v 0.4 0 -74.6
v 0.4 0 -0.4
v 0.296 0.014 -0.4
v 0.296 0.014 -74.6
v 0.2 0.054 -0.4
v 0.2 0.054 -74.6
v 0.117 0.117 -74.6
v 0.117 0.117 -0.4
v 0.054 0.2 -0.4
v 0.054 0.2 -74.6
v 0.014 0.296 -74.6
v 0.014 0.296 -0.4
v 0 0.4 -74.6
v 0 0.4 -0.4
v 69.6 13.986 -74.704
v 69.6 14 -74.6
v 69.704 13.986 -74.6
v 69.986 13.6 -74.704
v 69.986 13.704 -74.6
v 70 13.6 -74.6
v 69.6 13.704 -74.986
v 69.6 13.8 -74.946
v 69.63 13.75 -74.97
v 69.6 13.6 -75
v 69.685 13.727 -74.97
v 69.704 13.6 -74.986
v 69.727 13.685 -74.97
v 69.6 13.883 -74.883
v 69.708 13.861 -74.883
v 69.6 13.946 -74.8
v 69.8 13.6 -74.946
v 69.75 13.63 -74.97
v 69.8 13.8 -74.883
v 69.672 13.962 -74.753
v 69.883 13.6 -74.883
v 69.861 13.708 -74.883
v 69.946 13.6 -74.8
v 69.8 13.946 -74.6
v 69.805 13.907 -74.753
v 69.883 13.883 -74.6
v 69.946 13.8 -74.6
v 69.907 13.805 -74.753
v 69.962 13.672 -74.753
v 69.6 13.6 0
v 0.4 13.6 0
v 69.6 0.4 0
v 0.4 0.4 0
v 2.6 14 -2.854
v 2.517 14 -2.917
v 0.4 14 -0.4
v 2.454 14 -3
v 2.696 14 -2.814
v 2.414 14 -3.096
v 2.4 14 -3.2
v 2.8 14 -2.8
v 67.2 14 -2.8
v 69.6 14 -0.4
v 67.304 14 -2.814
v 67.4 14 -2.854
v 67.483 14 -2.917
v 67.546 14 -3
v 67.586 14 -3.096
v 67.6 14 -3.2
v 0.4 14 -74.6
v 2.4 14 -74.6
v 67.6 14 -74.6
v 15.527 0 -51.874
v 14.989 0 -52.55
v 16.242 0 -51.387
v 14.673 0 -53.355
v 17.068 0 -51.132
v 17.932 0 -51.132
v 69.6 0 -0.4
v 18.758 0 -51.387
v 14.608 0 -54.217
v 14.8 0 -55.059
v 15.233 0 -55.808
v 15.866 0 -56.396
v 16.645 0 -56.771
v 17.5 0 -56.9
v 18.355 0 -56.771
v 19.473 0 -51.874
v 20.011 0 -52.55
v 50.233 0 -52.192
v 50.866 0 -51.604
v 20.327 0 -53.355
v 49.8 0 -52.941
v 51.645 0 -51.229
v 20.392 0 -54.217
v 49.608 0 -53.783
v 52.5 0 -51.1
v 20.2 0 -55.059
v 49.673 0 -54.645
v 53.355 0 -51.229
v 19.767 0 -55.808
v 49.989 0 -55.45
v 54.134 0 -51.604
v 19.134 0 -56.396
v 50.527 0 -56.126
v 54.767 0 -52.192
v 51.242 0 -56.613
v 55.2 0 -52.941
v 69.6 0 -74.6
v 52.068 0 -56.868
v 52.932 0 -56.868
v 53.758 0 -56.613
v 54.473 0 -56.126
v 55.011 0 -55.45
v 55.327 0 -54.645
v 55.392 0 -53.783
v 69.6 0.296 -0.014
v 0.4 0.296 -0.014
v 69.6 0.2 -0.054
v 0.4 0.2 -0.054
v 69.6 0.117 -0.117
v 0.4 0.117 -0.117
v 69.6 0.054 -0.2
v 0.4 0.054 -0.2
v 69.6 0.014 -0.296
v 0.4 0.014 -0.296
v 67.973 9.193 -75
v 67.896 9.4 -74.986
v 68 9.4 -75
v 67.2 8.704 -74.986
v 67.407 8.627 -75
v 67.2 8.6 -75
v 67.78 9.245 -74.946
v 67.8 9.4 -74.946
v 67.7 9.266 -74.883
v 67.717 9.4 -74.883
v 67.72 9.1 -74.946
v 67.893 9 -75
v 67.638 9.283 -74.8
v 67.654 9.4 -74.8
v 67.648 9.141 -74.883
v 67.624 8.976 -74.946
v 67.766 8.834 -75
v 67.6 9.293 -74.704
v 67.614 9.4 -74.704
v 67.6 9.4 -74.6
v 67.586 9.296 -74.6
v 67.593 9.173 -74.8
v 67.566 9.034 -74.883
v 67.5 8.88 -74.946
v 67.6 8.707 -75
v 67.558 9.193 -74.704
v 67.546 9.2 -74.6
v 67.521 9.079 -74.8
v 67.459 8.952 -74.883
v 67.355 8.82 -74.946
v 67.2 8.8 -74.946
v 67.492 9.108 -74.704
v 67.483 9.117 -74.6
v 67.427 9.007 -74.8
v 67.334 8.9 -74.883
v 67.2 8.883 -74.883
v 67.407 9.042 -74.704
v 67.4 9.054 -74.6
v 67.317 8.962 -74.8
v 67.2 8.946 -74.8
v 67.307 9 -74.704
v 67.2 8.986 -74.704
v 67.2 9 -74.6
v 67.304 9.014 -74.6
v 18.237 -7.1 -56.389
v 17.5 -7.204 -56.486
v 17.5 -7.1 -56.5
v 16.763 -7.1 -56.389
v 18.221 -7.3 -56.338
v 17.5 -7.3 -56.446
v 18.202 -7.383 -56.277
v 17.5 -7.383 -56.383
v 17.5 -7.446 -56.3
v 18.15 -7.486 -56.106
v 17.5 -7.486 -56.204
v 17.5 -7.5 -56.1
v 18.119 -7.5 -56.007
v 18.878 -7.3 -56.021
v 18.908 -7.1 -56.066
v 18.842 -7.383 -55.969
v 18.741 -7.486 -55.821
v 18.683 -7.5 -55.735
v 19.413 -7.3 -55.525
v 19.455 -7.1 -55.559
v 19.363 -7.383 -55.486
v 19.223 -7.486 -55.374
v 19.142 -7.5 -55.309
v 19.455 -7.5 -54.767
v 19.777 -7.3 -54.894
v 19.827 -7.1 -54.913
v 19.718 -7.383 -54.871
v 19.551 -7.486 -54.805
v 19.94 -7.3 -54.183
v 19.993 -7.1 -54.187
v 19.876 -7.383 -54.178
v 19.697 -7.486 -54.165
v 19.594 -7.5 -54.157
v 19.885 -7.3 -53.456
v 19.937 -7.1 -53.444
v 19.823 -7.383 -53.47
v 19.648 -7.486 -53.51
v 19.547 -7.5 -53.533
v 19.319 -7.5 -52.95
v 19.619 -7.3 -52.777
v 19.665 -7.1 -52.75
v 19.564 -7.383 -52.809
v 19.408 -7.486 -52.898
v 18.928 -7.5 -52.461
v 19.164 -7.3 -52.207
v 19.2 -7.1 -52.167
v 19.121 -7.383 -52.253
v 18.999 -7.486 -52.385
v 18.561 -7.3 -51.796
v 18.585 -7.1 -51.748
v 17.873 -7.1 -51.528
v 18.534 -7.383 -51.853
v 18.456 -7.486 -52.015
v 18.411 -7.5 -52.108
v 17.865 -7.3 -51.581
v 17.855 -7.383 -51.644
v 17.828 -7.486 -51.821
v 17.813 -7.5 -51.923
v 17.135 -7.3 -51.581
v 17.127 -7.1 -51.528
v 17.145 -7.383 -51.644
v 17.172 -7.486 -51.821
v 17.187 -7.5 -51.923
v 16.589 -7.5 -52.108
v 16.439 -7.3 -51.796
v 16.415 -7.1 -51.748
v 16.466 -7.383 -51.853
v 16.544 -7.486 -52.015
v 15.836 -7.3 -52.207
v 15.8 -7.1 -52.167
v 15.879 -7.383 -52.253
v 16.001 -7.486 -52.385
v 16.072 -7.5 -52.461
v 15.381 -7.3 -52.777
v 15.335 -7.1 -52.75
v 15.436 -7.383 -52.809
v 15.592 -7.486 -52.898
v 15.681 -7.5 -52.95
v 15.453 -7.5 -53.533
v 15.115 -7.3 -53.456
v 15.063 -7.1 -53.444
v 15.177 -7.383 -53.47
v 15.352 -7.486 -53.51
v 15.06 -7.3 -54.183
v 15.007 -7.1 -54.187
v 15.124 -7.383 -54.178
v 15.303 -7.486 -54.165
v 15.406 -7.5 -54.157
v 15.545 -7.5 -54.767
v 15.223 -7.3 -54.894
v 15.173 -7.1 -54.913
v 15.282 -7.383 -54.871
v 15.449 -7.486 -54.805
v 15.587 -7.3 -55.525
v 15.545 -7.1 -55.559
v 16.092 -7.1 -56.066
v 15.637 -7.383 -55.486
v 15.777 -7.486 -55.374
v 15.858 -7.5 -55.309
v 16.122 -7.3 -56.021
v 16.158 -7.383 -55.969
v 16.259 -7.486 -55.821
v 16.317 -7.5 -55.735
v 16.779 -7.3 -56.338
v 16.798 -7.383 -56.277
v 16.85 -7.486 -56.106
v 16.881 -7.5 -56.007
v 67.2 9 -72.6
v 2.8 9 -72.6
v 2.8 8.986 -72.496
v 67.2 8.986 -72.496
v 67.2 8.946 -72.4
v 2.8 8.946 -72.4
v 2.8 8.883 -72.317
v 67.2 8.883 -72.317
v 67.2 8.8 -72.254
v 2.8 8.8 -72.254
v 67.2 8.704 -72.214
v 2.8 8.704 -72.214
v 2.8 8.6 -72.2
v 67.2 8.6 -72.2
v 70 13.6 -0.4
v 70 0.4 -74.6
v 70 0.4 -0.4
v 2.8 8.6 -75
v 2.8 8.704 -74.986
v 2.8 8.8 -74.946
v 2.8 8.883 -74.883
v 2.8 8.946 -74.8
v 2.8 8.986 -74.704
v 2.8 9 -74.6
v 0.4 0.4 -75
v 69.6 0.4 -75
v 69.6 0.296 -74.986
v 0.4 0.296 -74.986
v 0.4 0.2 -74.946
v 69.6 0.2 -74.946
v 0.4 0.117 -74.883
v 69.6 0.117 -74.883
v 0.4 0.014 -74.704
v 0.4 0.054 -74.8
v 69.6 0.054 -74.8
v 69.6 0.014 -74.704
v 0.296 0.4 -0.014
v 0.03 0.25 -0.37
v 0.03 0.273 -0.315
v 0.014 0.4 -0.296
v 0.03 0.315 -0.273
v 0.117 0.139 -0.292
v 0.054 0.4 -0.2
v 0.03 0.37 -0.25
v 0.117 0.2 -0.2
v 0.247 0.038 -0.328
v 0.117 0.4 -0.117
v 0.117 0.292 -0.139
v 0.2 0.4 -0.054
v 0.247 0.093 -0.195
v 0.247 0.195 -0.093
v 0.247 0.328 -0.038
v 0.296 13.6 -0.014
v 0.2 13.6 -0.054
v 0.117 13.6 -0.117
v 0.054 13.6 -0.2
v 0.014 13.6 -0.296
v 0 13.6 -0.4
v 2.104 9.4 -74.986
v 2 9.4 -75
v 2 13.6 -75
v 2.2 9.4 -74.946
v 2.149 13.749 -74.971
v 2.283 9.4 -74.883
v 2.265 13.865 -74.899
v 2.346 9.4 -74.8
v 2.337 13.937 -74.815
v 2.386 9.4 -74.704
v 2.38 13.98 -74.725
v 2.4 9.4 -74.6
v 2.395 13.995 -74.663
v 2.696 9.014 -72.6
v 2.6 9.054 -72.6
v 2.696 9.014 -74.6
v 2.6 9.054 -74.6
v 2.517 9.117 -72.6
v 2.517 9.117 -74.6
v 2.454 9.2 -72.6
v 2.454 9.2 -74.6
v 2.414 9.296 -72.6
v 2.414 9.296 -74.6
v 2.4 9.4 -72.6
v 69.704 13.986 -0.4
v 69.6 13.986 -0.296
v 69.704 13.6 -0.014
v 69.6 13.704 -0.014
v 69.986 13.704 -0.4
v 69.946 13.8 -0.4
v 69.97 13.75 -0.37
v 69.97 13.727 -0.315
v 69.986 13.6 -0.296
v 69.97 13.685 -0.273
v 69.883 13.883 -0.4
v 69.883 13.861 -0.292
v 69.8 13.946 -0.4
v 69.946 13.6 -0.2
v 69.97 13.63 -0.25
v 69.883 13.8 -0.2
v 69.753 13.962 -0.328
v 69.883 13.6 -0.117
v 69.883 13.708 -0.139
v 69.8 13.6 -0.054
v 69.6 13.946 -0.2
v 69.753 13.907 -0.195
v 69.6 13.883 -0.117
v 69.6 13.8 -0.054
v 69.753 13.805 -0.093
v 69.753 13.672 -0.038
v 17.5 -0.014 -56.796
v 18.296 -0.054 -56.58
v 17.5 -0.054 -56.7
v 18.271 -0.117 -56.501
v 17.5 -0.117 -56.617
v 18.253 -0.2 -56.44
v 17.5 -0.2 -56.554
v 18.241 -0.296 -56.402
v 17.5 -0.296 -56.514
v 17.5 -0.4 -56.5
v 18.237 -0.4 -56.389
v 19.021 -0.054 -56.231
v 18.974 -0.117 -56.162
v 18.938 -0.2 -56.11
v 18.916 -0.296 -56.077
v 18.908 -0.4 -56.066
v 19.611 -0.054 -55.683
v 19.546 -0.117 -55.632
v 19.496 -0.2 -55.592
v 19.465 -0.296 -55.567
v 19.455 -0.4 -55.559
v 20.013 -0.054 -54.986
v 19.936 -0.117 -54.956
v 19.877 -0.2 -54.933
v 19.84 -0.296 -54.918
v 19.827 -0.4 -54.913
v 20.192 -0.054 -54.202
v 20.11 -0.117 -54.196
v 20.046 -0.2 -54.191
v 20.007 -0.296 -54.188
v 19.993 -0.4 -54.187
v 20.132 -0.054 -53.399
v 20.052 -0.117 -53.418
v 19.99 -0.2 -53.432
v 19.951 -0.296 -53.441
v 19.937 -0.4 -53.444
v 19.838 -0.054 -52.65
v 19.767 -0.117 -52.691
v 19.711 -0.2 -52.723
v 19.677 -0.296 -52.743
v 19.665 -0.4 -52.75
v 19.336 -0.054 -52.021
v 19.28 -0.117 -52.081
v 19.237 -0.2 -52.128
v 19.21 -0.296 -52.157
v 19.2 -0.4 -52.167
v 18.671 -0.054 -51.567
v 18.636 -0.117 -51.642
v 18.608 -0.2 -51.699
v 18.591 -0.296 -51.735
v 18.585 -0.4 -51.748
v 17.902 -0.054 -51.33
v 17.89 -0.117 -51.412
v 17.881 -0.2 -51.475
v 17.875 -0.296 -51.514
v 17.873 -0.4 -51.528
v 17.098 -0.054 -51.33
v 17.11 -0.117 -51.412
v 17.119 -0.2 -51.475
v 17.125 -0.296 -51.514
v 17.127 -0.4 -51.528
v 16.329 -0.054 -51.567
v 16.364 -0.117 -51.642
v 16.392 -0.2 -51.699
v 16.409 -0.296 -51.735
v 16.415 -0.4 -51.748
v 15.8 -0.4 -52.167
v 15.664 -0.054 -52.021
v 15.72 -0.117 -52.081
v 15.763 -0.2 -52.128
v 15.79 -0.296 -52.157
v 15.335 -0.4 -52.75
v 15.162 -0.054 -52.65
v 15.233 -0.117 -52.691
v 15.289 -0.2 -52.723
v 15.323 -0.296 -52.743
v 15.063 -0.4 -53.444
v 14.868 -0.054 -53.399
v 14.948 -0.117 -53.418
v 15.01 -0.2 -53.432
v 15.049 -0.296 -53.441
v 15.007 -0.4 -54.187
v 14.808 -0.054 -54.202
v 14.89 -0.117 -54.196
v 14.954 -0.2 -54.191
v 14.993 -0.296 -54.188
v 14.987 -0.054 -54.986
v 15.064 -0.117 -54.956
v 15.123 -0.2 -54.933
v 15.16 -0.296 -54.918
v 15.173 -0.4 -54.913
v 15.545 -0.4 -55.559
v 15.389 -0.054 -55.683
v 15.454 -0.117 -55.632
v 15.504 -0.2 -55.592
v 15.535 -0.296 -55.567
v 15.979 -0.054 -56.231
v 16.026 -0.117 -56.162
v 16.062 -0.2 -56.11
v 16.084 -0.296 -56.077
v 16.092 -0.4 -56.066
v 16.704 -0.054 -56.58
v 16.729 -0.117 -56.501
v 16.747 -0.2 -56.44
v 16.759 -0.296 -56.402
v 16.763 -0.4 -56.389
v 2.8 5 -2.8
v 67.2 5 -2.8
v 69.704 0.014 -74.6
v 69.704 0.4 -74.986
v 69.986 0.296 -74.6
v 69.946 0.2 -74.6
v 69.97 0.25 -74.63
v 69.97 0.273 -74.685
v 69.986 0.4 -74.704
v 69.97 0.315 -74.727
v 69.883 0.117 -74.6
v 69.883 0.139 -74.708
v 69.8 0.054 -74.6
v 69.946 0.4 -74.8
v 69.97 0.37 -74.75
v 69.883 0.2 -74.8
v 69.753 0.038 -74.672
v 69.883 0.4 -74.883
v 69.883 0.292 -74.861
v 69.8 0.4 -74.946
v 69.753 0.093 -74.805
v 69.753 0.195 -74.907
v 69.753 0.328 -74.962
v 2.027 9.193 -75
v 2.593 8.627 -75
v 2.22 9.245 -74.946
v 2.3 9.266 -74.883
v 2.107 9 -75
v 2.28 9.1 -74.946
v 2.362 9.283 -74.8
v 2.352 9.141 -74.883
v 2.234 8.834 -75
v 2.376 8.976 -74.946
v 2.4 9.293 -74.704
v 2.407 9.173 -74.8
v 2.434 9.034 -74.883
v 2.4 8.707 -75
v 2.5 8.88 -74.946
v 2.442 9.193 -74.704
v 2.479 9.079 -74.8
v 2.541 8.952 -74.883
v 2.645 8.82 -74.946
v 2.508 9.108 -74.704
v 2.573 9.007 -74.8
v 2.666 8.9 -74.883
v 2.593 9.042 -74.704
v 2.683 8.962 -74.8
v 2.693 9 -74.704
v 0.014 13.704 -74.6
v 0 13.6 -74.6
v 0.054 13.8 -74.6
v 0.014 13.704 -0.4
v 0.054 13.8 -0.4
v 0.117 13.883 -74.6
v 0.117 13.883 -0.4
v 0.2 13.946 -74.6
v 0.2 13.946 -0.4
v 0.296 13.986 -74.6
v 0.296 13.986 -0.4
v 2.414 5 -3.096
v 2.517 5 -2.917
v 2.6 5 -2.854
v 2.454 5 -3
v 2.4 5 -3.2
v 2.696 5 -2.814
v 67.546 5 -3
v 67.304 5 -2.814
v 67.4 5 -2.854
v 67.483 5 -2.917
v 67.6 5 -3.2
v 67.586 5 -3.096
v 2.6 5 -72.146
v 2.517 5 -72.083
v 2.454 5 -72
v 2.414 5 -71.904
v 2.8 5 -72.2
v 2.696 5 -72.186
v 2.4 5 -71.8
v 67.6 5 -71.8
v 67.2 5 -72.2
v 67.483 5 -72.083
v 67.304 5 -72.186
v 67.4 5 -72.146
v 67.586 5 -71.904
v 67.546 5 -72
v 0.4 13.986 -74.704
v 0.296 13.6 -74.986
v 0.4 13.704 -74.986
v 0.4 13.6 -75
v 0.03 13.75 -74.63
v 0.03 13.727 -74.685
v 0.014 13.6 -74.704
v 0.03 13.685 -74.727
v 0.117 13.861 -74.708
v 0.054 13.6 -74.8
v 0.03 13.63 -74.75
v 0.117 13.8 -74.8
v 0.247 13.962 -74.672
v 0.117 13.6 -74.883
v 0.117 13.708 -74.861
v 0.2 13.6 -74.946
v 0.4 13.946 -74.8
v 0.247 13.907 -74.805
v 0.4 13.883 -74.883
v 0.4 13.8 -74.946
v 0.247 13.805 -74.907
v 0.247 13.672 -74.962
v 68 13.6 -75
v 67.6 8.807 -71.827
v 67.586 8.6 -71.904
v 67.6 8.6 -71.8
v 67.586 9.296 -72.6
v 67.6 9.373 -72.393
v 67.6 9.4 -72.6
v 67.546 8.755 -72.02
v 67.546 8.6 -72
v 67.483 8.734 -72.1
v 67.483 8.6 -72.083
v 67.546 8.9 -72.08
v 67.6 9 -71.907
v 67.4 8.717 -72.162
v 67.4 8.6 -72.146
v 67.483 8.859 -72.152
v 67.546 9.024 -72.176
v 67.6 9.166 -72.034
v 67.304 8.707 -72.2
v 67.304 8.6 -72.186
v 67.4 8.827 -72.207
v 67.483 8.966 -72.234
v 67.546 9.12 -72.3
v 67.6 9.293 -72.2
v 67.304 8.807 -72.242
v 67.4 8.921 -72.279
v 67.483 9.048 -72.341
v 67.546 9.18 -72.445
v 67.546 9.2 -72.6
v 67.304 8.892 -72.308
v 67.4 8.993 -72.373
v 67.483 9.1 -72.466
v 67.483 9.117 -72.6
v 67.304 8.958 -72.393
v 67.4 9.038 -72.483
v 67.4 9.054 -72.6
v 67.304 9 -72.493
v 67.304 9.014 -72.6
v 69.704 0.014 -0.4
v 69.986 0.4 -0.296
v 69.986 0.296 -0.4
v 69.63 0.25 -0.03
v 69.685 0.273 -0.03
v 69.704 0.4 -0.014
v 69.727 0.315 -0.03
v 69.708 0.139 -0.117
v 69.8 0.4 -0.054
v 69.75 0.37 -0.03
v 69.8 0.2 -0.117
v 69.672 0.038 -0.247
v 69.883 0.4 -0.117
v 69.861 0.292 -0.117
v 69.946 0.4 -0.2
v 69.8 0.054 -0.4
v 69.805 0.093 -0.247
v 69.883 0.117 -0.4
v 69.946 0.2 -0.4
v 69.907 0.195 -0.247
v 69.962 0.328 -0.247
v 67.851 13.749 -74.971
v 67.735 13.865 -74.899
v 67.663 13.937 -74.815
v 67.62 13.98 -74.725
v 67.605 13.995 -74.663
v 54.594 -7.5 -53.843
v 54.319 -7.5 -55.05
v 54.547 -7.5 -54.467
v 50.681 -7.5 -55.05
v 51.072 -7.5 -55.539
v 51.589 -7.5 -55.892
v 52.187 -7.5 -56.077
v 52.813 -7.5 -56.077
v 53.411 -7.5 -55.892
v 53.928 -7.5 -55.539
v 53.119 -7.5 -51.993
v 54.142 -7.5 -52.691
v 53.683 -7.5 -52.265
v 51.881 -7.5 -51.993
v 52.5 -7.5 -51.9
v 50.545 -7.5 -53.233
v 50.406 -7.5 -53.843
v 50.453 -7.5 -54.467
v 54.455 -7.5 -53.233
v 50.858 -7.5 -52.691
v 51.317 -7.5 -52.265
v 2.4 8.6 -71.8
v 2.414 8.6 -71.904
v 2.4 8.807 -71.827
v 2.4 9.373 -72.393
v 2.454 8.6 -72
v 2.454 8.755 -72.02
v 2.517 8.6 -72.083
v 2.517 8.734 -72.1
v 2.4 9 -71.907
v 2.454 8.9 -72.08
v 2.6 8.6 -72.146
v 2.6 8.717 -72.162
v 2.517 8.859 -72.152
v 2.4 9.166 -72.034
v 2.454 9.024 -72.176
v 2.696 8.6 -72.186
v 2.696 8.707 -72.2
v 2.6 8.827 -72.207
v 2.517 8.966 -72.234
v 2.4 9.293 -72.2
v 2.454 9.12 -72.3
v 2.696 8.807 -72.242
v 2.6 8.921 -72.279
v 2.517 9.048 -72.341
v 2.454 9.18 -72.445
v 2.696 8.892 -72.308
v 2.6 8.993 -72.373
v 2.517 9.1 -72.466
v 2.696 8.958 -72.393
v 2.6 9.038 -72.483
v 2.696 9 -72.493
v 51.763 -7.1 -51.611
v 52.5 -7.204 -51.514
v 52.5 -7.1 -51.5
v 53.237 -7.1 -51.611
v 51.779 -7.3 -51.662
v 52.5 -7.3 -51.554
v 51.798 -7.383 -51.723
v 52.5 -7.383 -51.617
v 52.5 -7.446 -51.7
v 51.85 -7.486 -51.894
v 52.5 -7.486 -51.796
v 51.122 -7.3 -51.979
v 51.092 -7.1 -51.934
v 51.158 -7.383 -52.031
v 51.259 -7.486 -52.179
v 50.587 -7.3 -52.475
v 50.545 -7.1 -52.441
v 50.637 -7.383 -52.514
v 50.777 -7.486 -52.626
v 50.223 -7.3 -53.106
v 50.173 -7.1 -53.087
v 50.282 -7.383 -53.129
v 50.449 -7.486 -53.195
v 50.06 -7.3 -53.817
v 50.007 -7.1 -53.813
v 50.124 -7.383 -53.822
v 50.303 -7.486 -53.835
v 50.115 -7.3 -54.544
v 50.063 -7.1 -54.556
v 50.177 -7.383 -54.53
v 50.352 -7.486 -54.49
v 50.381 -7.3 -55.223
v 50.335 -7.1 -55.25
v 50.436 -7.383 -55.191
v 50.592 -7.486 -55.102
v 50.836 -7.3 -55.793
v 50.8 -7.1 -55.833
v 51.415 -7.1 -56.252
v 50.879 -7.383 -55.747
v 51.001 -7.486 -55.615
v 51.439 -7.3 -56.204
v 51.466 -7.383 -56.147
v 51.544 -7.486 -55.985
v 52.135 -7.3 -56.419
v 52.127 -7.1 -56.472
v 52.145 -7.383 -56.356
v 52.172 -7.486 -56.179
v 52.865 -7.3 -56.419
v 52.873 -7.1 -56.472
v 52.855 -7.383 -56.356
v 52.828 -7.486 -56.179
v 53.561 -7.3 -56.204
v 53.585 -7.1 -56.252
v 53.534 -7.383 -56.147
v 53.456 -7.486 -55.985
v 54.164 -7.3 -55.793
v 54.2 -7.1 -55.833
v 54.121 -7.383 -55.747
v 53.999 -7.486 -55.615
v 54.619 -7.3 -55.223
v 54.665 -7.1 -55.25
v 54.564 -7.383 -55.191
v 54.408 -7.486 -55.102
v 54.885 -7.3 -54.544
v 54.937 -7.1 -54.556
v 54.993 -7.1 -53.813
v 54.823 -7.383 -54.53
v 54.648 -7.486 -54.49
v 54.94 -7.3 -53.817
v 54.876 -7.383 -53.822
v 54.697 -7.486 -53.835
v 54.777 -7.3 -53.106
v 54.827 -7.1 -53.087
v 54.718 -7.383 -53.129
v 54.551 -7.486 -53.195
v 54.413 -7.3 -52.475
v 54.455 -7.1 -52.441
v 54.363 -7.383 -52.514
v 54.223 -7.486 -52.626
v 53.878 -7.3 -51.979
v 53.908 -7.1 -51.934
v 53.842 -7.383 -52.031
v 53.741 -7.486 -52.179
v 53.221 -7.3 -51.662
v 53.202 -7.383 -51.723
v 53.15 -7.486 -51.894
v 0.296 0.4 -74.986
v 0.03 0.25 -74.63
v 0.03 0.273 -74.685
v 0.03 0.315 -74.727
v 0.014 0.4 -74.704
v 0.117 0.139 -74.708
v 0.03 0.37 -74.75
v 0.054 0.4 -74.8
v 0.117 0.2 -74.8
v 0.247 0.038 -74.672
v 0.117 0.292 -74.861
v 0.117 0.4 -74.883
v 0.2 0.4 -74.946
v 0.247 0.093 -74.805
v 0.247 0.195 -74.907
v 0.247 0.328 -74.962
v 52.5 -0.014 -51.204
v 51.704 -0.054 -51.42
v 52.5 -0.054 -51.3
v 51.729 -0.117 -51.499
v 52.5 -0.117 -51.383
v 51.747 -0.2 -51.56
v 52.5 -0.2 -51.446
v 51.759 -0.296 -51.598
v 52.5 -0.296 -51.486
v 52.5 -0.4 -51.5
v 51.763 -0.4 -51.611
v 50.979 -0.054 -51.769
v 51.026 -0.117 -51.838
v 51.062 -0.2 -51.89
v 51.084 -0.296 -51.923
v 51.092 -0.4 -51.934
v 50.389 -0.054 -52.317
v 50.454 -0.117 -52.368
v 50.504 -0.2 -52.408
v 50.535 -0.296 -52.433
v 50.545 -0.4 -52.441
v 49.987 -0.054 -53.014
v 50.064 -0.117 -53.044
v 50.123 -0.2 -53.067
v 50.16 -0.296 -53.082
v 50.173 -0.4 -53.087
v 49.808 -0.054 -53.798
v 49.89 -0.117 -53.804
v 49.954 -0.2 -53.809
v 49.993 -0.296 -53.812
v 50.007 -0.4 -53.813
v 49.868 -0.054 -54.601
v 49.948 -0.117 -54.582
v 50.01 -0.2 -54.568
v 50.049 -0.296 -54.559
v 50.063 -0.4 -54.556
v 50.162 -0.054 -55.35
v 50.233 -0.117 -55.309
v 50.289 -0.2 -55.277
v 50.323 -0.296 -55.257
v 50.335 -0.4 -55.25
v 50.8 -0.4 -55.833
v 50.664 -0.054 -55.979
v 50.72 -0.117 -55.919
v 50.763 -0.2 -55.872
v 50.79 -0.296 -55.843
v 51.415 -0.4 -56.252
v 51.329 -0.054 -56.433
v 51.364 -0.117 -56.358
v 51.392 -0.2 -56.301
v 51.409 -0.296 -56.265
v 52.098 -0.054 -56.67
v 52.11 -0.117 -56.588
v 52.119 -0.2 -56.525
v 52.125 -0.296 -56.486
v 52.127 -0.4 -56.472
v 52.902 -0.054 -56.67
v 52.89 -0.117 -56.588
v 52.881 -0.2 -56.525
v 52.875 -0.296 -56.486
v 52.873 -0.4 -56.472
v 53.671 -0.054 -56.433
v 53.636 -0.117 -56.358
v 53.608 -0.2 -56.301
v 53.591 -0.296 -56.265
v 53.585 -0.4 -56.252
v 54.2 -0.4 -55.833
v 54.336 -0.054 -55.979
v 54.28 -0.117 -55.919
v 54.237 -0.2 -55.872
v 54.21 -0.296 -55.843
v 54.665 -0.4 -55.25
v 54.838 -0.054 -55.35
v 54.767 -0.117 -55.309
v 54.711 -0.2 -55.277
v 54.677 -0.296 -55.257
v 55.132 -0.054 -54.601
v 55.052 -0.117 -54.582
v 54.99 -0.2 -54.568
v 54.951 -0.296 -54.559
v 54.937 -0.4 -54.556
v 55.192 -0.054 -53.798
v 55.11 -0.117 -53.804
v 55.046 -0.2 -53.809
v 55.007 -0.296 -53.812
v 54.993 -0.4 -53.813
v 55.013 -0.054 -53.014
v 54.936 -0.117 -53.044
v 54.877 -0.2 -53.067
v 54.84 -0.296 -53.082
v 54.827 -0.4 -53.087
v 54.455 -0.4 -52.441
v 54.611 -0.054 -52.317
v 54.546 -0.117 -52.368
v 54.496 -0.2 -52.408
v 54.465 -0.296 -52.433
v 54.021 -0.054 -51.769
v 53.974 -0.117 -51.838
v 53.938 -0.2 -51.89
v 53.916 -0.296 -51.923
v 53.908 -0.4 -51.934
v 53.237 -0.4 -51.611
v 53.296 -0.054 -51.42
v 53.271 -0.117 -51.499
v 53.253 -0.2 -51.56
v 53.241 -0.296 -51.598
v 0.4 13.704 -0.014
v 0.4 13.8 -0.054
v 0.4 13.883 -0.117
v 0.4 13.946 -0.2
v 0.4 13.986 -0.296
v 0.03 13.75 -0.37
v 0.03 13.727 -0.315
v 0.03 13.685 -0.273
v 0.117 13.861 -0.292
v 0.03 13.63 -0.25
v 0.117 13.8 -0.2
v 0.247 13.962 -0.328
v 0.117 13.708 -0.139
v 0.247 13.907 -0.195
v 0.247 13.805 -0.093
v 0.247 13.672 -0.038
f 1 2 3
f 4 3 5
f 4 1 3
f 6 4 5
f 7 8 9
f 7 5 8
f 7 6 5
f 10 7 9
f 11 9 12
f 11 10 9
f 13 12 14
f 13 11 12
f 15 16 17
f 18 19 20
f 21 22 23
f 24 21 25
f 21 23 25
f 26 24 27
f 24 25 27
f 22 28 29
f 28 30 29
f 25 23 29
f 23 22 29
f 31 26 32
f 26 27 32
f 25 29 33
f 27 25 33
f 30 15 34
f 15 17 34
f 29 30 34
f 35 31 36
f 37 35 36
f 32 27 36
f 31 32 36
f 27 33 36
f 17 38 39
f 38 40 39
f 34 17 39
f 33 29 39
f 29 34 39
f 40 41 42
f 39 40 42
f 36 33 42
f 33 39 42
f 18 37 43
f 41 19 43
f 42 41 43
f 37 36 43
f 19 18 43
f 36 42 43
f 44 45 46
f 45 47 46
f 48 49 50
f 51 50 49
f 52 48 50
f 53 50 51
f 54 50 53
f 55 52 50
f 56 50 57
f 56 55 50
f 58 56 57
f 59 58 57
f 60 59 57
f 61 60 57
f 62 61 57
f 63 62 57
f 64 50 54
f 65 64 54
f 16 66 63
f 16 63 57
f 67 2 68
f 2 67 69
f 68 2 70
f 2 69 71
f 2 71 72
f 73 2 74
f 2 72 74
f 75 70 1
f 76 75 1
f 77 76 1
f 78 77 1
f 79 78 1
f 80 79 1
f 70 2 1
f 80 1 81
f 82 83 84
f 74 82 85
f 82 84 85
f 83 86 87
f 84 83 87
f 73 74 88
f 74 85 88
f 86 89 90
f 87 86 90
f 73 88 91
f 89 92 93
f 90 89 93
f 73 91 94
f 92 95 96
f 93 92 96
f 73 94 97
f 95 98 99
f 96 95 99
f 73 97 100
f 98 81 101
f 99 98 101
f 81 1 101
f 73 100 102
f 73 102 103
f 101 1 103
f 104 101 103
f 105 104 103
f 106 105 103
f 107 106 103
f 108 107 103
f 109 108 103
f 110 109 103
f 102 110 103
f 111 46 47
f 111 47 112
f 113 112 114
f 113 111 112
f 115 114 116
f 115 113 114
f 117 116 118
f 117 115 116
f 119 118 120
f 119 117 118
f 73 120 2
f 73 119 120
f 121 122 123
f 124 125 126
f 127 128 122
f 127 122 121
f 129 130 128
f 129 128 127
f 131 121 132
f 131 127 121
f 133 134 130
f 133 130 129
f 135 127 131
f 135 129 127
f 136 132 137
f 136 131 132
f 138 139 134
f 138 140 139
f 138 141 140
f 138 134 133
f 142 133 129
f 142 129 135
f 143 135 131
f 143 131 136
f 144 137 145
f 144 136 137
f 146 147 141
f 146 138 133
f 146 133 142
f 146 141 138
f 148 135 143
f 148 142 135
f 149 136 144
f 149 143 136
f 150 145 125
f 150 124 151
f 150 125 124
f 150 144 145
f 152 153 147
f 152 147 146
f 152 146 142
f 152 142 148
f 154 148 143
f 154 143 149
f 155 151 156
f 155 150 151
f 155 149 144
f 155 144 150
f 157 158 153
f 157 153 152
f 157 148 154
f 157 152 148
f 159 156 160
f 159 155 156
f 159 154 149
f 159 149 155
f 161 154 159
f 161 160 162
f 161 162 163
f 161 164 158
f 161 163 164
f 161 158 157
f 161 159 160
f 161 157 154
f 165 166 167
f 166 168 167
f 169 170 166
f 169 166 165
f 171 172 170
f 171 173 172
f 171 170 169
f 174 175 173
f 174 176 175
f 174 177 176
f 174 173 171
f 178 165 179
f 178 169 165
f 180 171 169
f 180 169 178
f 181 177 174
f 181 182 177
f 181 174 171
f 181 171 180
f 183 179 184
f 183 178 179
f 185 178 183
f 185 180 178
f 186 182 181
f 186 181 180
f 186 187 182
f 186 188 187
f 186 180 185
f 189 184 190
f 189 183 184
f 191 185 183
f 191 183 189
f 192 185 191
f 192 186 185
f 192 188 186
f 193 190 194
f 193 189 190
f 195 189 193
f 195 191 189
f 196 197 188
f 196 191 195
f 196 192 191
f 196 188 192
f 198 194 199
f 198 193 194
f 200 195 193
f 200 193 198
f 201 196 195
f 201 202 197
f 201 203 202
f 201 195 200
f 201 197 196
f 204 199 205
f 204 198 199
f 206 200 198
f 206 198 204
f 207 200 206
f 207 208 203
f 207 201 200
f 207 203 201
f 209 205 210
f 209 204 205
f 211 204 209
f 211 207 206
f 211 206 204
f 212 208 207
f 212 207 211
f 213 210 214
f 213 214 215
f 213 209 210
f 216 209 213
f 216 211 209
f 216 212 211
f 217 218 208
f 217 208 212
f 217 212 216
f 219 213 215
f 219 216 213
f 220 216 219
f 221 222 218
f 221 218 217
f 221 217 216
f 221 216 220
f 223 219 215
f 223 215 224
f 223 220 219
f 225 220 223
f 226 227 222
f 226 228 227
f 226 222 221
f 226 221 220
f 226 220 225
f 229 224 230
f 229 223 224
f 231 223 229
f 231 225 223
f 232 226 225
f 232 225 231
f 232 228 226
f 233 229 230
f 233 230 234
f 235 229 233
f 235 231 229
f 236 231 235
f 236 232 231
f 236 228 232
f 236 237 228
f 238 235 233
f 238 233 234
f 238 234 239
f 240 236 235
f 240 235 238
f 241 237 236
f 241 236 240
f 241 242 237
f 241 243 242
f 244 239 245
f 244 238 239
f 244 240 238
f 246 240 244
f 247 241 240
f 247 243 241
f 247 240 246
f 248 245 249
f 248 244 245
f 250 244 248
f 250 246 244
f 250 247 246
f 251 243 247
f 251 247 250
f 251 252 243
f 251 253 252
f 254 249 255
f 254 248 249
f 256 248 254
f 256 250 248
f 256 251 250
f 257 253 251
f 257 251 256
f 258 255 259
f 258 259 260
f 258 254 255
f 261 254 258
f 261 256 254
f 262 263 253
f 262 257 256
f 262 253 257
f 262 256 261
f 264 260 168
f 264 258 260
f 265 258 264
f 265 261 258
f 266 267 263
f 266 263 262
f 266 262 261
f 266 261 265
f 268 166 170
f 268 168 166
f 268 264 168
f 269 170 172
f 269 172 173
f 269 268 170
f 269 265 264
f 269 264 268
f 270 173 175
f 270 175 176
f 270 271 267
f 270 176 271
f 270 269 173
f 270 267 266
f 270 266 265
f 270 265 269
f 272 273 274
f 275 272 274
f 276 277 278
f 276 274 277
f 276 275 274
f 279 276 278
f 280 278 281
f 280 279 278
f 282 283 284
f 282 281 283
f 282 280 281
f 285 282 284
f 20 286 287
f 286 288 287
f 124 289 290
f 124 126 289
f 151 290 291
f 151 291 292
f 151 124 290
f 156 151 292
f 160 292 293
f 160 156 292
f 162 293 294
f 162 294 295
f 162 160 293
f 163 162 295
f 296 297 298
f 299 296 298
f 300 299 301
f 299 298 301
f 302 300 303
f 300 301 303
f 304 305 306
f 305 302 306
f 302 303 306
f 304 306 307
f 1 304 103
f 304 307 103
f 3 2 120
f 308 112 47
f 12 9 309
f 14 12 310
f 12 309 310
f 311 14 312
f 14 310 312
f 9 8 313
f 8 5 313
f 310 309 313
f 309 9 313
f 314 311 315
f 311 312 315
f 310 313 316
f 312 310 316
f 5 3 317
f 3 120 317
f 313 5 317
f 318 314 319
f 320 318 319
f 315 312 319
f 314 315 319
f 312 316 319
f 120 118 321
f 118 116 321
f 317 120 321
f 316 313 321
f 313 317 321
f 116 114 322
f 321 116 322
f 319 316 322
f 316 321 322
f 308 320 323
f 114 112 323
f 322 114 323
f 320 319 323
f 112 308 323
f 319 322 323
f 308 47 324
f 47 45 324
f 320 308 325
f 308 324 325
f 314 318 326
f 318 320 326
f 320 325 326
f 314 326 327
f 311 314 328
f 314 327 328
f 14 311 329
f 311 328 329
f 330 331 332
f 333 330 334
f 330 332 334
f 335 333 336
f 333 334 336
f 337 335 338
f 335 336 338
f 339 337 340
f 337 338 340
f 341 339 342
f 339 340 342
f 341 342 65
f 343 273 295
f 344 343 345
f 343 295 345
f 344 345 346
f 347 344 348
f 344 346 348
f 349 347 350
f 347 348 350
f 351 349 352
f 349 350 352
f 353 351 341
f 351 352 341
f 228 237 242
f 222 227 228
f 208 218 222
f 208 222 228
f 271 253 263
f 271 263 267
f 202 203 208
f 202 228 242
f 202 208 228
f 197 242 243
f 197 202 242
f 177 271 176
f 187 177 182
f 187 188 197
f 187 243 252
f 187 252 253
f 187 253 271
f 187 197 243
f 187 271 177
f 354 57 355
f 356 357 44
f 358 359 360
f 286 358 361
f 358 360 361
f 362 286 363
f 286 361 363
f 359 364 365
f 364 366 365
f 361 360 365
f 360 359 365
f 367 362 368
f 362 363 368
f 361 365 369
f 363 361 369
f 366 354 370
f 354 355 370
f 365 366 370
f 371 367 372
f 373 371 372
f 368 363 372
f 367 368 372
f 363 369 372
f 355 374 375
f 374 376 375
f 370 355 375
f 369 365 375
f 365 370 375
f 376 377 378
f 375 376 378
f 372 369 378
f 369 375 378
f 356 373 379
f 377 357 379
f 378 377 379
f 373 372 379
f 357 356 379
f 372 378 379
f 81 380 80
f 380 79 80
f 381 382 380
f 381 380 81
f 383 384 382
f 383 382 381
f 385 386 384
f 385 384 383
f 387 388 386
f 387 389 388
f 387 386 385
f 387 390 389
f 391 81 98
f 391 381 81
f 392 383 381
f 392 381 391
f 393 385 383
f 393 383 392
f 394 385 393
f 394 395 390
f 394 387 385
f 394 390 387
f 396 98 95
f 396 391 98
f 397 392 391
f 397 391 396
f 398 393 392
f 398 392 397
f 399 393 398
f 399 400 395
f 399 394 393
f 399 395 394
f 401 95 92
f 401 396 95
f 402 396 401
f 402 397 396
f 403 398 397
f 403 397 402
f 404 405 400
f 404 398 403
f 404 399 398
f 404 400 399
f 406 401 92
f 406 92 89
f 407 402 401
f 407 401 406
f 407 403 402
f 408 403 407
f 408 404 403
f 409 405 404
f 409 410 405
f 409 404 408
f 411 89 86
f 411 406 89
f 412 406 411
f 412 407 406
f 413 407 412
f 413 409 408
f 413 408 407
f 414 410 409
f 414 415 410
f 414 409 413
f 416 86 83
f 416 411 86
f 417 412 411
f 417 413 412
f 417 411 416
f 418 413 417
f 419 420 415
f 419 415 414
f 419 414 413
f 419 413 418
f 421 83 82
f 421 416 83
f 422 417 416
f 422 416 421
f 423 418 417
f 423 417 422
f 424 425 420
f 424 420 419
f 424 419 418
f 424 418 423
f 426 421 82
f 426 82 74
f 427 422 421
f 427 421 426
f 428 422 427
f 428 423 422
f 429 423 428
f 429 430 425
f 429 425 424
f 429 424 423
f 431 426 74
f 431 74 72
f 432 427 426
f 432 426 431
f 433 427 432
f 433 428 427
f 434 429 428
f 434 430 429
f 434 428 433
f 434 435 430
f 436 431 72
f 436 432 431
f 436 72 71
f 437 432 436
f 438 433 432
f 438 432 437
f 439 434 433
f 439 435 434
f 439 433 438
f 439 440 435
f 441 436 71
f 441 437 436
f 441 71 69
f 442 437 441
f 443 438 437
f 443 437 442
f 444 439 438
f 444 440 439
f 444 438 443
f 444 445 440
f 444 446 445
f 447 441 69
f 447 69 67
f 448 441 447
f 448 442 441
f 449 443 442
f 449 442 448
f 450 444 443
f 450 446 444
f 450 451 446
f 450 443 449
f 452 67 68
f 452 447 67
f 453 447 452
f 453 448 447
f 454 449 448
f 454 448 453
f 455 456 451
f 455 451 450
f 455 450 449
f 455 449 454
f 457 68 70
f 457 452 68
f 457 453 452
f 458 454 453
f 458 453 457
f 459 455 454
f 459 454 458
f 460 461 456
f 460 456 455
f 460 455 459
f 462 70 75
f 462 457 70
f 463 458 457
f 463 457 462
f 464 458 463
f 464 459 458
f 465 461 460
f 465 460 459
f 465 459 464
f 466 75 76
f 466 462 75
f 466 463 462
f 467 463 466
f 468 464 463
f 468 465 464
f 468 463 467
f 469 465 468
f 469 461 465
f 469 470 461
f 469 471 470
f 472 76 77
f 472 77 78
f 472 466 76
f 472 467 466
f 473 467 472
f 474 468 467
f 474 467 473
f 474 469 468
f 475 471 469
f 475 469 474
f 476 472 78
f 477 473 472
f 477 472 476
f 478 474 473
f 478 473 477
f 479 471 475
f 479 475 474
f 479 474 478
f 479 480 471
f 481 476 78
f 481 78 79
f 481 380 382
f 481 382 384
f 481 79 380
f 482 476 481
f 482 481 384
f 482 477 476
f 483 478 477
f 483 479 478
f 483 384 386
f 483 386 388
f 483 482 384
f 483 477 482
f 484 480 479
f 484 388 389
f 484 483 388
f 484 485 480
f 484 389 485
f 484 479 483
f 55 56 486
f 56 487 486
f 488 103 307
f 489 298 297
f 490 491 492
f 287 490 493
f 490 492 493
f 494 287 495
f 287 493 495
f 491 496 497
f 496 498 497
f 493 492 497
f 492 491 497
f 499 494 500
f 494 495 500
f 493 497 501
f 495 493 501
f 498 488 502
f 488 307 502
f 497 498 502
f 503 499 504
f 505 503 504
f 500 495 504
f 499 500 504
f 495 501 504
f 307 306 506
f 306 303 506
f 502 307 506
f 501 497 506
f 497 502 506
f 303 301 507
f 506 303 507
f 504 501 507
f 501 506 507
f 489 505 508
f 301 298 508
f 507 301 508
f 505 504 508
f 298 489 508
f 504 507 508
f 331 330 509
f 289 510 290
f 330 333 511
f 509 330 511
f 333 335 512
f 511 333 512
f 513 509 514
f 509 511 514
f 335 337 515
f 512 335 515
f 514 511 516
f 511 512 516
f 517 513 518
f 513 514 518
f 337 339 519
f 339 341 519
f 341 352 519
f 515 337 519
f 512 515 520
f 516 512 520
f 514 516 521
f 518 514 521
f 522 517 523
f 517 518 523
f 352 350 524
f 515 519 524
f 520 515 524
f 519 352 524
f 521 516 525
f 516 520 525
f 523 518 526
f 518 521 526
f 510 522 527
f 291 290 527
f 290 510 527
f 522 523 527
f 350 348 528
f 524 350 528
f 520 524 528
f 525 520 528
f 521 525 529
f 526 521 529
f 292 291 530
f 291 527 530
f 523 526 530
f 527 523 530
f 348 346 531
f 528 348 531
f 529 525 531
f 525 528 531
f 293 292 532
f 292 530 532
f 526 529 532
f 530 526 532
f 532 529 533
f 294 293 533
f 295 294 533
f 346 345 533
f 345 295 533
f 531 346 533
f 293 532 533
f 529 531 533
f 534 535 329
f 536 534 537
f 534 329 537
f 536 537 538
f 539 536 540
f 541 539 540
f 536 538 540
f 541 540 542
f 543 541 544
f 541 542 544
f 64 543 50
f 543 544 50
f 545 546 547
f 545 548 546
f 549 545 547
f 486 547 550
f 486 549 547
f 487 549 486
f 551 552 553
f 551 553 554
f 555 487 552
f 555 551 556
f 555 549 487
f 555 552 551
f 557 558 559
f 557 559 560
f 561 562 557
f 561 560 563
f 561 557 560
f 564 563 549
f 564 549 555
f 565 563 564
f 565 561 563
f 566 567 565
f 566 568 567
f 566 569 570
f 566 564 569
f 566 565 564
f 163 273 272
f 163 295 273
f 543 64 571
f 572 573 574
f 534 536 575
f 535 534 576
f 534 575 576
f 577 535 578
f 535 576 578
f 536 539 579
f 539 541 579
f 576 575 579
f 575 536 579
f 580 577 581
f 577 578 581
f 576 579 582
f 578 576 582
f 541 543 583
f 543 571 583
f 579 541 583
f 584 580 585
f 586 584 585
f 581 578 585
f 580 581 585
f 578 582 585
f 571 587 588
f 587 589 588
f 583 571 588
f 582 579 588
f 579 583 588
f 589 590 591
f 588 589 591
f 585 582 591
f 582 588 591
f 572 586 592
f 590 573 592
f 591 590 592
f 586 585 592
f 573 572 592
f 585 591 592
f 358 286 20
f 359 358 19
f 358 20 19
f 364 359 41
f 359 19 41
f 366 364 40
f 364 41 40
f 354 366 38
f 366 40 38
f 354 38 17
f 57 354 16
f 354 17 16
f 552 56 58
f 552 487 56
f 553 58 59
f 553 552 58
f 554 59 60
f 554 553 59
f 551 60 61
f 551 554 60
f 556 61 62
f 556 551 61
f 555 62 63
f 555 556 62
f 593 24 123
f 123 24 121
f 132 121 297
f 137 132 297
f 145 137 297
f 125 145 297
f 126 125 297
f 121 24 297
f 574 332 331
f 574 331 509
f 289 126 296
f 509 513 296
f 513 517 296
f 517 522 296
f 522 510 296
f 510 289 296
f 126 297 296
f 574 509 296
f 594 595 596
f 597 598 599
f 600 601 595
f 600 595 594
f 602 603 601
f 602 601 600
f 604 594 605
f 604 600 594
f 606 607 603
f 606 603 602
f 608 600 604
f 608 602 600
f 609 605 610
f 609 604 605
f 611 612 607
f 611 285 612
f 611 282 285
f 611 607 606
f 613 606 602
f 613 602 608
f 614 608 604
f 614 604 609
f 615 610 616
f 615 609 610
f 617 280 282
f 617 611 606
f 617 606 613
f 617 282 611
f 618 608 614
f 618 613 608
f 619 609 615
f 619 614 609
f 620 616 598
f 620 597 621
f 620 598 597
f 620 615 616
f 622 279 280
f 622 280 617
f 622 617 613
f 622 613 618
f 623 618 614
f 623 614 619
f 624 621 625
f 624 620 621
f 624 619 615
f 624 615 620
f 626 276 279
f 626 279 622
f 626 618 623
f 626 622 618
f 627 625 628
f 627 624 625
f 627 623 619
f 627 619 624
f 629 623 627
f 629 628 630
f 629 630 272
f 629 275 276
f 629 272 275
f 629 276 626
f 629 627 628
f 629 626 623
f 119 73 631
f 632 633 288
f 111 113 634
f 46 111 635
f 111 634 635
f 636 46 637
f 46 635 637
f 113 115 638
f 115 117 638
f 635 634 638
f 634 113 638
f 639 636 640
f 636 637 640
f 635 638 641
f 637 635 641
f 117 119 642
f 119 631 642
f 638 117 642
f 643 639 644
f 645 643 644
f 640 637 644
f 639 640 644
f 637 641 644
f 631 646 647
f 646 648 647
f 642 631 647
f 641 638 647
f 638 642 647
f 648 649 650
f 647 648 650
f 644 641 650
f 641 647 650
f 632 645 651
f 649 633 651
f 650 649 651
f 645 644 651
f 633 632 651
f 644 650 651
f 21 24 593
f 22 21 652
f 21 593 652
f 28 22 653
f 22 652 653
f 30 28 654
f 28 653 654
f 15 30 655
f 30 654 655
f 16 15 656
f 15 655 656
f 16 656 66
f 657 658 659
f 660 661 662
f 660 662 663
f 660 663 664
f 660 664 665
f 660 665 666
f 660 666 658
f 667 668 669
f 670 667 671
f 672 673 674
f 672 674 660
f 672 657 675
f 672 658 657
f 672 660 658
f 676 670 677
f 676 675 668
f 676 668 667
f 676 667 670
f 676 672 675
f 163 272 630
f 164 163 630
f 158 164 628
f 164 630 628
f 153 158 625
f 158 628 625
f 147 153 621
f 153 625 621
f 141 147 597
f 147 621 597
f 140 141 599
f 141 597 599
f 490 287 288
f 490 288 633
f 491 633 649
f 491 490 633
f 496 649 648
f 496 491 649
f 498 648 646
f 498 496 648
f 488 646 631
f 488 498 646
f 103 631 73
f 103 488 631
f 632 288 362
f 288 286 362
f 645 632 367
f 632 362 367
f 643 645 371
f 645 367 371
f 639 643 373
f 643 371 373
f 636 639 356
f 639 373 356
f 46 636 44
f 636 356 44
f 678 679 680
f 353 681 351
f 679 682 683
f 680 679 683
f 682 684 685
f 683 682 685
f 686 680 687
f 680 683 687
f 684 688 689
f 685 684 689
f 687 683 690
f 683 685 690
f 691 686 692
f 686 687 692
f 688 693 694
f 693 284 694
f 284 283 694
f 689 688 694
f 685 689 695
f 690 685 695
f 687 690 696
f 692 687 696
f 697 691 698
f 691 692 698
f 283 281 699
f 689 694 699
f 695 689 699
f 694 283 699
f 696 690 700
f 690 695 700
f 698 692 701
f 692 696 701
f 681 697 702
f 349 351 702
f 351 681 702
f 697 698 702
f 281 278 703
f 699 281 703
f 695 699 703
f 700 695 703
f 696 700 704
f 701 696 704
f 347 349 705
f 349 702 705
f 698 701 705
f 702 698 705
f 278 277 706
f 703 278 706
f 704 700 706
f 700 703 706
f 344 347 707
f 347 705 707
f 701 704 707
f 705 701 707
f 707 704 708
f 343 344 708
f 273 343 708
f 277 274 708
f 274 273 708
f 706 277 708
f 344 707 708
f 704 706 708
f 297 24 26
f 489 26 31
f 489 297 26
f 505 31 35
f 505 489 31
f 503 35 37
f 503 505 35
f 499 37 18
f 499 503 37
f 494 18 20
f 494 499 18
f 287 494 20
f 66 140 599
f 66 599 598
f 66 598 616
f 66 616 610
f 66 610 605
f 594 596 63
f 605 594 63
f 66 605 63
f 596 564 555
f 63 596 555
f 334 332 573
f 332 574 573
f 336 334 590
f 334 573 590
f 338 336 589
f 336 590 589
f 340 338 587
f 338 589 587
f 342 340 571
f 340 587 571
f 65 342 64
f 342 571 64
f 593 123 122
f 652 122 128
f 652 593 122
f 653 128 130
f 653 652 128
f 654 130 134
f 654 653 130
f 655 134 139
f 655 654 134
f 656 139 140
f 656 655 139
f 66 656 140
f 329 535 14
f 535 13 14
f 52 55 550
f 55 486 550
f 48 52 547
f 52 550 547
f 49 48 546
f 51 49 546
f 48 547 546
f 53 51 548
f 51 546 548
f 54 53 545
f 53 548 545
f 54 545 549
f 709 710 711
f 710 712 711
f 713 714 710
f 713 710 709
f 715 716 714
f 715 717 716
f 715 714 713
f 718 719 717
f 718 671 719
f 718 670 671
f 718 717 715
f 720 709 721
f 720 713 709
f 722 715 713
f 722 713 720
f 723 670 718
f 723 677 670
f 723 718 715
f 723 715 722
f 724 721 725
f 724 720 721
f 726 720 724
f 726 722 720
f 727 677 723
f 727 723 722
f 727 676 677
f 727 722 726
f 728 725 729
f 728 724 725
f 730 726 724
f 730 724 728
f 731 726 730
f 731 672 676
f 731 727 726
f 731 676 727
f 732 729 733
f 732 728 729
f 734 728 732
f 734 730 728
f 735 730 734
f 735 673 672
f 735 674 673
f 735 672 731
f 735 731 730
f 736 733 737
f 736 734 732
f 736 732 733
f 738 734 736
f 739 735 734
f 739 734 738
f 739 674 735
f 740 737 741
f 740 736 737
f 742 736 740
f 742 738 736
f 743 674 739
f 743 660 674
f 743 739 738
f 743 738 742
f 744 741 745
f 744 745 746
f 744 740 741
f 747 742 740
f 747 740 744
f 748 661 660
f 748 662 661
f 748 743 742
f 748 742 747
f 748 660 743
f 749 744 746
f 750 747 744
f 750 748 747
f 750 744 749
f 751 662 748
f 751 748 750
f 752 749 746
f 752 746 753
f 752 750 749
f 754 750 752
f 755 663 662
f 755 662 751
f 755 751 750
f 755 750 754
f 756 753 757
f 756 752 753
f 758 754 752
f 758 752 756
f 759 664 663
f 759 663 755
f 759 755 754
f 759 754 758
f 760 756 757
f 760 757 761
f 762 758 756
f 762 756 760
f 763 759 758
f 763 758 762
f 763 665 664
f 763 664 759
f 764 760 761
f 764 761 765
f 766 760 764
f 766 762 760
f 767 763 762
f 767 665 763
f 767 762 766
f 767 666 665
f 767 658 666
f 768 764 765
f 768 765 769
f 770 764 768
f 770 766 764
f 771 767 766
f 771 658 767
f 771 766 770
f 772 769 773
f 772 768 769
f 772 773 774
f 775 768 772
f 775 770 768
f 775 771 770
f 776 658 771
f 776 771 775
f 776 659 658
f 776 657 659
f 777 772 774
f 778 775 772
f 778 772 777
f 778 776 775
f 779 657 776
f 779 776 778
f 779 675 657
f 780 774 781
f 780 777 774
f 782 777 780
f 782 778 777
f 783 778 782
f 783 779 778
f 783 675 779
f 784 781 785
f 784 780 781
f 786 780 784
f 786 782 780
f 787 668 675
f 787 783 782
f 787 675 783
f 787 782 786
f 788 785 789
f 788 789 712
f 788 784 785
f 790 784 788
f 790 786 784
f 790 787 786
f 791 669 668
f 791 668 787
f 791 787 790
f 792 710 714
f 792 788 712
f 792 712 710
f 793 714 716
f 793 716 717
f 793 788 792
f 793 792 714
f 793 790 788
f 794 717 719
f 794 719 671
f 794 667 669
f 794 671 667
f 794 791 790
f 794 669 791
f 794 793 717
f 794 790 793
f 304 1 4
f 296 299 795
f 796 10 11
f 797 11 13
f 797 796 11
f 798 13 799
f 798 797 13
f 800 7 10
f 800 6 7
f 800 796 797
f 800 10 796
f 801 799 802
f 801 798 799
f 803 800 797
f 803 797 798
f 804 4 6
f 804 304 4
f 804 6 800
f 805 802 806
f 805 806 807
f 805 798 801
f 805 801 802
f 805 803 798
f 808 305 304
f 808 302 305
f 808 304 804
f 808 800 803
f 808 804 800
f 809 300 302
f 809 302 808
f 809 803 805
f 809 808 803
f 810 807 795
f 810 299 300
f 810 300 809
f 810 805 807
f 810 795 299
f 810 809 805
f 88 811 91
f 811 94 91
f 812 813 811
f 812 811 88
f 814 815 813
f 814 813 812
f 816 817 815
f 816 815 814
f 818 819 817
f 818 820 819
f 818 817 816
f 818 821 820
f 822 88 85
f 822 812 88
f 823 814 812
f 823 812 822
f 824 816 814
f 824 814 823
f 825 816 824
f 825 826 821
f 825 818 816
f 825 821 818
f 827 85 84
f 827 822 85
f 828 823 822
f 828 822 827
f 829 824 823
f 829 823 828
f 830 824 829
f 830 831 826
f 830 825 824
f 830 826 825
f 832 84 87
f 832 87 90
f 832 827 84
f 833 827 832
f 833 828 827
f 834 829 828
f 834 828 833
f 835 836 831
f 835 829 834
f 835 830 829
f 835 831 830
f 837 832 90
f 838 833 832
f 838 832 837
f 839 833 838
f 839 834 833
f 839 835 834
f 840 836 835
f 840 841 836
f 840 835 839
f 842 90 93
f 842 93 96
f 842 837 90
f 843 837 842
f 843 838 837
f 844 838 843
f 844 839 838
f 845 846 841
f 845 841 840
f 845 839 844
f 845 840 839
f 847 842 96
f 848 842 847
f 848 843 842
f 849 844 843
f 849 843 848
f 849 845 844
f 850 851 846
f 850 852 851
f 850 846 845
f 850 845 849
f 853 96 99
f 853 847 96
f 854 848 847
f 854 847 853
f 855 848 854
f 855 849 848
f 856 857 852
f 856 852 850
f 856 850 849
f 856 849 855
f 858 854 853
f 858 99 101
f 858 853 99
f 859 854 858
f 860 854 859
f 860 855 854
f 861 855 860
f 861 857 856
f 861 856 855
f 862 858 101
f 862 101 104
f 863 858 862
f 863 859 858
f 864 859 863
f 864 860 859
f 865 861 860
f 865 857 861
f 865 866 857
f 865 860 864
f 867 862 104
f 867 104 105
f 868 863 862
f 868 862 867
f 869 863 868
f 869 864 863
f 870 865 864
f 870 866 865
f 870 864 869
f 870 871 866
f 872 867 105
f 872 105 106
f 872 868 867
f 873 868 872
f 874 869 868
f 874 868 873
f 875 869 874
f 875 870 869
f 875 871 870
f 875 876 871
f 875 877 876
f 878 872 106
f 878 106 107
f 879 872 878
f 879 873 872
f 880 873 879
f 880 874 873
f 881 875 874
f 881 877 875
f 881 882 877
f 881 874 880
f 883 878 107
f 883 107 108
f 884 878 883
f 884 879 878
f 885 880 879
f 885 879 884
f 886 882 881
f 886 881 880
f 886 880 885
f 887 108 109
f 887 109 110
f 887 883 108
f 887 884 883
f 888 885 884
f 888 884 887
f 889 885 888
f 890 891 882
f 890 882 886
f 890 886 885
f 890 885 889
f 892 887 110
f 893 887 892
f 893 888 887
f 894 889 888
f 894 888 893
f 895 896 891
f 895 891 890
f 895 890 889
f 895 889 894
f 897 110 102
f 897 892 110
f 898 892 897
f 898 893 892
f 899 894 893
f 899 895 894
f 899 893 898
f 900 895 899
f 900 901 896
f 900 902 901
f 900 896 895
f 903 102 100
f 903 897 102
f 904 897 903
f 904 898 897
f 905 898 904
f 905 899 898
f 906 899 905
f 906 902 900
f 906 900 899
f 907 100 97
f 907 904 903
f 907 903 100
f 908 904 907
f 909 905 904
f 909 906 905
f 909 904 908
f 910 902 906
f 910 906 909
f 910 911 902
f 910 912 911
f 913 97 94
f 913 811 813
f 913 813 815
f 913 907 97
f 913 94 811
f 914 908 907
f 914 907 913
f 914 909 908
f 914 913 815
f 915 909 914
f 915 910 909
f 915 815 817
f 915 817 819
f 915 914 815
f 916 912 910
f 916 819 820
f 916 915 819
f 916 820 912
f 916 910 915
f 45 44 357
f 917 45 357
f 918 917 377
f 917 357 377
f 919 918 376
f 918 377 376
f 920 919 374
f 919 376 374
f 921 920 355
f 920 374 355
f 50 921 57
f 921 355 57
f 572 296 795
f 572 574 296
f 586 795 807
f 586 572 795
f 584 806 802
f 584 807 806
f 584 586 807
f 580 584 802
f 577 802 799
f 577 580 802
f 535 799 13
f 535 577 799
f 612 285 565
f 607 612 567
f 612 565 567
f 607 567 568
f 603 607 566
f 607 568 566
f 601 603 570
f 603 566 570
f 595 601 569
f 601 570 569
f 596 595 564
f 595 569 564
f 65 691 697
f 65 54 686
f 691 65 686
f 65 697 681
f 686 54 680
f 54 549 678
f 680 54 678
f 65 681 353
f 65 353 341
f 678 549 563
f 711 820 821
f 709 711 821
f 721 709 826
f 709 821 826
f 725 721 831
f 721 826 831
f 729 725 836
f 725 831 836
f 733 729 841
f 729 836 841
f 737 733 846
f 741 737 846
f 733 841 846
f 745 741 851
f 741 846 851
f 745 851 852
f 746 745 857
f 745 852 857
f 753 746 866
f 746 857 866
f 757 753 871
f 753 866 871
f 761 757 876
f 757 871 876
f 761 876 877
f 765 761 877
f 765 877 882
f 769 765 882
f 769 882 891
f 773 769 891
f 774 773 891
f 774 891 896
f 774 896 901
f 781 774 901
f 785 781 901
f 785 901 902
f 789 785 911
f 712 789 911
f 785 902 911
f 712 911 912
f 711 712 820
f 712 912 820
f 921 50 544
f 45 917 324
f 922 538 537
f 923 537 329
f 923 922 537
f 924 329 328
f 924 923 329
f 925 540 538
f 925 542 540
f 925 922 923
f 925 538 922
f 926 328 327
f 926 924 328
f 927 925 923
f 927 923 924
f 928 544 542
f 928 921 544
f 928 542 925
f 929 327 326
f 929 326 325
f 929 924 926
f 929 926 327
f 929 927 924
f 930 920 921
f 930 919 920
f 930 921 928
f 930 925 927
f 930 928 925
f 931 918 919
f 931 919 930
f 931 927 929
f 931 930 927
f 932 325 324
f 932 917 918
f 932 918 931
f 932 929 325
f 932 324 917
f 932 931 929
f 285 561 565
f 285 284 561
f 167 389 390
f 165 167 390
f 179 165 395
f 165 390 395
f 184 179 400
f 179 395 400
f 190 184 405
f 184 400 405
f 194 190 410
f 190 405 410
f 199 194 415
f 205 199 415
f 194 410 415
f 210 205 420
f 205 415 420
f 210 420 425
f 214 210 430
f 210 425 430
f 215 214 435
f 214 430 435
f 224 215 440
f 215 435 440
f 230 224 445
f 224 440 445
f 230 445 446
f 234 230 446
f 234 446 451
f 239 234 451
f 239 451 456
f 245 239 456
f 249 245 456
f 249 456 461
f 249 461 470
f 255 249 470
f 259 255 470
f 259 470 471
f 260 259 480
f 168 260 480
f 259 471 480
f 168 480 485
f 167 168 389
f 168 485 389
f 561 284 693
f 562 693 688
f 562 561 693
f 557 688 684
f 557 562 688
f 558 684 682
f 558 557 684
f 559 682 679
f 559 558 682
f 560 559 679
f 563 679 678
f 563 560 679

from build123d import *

# Parameters (mm, degrees)
SKETCH1_W           = 70
SKETCH1_H           = 75
BOSS_EXTRUDE1_DEPTH = 9
SKETCH2_W           = 65.2
SKETCH2_H           = 69.4
CUT_EXTRUDE1_DEPTH  = 4
SKETCH4_R           = 2.5
BOSS_EXTRUDE3_DEPTH = 7.5
BOSS_EXTRUDE4_DEPTH = 5
FILLET1_R           = 0.4


with BuildPart() as part:
    # Sketch1 → Boss-Extrude1 (new body)
    with BuildSketch(Plane(origin=(0, 0, 0), x_dir=(1, 0, 0), z_dir=(0, 1, 0))):
        with Locations((35, 37.5)):
            Rectangle(SKETCH1_W, SKETCH1_H)
    extrude(amount=BOSS_EXTRUDE1_DEPTH)

    # Sketch2 → Cut-Extrude1 (cut)
    with BuildSketch(Plane(origin=(0, 9, 0), x_dir=(1, 0, 0), z_dir=(0, 1, 0))):
        with Locations((35, 37.5)):
            Rectangle(SKETCH2_W, SKETCH2_H)
    extrude(amount=-CUT_EXTRUDE1_DEPTH, mode=Mode.SUBTRACT)

    # Sketch4 → Boss-Extrude3 (add)
    with BuildSketch(Plane.XZ):
        with Locations(Location((17.5, -54, 0), (0, 0, 270))):
            Circle(SKETCH4_R)
        with Locations(Location((52.5, -54, 0), (0, 0, 90))):
            Circle(SKETCH4_R)
    extrude(amount=BOSS_EXTRUDE3_DEPTH)

    # Sketch5 → Boss-Extrude4 (add)
    with BuildSketch(Plane(origin=(0, 9, 0), x_dir=(1, 0, 0), z_dir=(0, 1, 0))):
        Polygon((2.4, 75), (0, 75), (0, 0), (70, 0), (70, 75), (67.6, 75), (67.6, 2.8), (2.4, 2.8), align=None)
    extrude(amount=BOSS_EXTRUDE4_DEPTH)

    # Fillet1
    fillet1_edges = [part.edges().sort_by_distance(p)[0] for p in [
        (35, 9, -72.2),
        (2.4, 7, -72.2),
        (2.4, 9.5, -2.8),
        (67.6, 9.5, -2.8),
        (67.6, 7, -72.2),
        (17.5, 0, -51.5),
        (17.5, -7.5, -51.5),
        (52.5, 0, -56.5),
        (52.5, -7.5, -56.5),
        (35, 9, -75),
        (2.4, 9, -73.6),
        (67.6, 9, -73.6),
        (35, 14, 0),
        (70, 14, -37.5),
        (68.8, 14, -75),
        (1.2, 14, -75),
        (0, 14, -37.5),
        (2.4, 11.5, -75),
        (67.6, 11.5, -75),
        (35, 0, -75),
        (70, 0, -37.5),
        (35, 0, 0),
        (0, 0, -37.5),
        (0, 7, -75),
        (70, 7, -75),
        (70, 7, 0),
        (0, 7, 0),
    ]]
    fillet(fillet1_edges, radius=FILLET1_R)


solid = part.part
